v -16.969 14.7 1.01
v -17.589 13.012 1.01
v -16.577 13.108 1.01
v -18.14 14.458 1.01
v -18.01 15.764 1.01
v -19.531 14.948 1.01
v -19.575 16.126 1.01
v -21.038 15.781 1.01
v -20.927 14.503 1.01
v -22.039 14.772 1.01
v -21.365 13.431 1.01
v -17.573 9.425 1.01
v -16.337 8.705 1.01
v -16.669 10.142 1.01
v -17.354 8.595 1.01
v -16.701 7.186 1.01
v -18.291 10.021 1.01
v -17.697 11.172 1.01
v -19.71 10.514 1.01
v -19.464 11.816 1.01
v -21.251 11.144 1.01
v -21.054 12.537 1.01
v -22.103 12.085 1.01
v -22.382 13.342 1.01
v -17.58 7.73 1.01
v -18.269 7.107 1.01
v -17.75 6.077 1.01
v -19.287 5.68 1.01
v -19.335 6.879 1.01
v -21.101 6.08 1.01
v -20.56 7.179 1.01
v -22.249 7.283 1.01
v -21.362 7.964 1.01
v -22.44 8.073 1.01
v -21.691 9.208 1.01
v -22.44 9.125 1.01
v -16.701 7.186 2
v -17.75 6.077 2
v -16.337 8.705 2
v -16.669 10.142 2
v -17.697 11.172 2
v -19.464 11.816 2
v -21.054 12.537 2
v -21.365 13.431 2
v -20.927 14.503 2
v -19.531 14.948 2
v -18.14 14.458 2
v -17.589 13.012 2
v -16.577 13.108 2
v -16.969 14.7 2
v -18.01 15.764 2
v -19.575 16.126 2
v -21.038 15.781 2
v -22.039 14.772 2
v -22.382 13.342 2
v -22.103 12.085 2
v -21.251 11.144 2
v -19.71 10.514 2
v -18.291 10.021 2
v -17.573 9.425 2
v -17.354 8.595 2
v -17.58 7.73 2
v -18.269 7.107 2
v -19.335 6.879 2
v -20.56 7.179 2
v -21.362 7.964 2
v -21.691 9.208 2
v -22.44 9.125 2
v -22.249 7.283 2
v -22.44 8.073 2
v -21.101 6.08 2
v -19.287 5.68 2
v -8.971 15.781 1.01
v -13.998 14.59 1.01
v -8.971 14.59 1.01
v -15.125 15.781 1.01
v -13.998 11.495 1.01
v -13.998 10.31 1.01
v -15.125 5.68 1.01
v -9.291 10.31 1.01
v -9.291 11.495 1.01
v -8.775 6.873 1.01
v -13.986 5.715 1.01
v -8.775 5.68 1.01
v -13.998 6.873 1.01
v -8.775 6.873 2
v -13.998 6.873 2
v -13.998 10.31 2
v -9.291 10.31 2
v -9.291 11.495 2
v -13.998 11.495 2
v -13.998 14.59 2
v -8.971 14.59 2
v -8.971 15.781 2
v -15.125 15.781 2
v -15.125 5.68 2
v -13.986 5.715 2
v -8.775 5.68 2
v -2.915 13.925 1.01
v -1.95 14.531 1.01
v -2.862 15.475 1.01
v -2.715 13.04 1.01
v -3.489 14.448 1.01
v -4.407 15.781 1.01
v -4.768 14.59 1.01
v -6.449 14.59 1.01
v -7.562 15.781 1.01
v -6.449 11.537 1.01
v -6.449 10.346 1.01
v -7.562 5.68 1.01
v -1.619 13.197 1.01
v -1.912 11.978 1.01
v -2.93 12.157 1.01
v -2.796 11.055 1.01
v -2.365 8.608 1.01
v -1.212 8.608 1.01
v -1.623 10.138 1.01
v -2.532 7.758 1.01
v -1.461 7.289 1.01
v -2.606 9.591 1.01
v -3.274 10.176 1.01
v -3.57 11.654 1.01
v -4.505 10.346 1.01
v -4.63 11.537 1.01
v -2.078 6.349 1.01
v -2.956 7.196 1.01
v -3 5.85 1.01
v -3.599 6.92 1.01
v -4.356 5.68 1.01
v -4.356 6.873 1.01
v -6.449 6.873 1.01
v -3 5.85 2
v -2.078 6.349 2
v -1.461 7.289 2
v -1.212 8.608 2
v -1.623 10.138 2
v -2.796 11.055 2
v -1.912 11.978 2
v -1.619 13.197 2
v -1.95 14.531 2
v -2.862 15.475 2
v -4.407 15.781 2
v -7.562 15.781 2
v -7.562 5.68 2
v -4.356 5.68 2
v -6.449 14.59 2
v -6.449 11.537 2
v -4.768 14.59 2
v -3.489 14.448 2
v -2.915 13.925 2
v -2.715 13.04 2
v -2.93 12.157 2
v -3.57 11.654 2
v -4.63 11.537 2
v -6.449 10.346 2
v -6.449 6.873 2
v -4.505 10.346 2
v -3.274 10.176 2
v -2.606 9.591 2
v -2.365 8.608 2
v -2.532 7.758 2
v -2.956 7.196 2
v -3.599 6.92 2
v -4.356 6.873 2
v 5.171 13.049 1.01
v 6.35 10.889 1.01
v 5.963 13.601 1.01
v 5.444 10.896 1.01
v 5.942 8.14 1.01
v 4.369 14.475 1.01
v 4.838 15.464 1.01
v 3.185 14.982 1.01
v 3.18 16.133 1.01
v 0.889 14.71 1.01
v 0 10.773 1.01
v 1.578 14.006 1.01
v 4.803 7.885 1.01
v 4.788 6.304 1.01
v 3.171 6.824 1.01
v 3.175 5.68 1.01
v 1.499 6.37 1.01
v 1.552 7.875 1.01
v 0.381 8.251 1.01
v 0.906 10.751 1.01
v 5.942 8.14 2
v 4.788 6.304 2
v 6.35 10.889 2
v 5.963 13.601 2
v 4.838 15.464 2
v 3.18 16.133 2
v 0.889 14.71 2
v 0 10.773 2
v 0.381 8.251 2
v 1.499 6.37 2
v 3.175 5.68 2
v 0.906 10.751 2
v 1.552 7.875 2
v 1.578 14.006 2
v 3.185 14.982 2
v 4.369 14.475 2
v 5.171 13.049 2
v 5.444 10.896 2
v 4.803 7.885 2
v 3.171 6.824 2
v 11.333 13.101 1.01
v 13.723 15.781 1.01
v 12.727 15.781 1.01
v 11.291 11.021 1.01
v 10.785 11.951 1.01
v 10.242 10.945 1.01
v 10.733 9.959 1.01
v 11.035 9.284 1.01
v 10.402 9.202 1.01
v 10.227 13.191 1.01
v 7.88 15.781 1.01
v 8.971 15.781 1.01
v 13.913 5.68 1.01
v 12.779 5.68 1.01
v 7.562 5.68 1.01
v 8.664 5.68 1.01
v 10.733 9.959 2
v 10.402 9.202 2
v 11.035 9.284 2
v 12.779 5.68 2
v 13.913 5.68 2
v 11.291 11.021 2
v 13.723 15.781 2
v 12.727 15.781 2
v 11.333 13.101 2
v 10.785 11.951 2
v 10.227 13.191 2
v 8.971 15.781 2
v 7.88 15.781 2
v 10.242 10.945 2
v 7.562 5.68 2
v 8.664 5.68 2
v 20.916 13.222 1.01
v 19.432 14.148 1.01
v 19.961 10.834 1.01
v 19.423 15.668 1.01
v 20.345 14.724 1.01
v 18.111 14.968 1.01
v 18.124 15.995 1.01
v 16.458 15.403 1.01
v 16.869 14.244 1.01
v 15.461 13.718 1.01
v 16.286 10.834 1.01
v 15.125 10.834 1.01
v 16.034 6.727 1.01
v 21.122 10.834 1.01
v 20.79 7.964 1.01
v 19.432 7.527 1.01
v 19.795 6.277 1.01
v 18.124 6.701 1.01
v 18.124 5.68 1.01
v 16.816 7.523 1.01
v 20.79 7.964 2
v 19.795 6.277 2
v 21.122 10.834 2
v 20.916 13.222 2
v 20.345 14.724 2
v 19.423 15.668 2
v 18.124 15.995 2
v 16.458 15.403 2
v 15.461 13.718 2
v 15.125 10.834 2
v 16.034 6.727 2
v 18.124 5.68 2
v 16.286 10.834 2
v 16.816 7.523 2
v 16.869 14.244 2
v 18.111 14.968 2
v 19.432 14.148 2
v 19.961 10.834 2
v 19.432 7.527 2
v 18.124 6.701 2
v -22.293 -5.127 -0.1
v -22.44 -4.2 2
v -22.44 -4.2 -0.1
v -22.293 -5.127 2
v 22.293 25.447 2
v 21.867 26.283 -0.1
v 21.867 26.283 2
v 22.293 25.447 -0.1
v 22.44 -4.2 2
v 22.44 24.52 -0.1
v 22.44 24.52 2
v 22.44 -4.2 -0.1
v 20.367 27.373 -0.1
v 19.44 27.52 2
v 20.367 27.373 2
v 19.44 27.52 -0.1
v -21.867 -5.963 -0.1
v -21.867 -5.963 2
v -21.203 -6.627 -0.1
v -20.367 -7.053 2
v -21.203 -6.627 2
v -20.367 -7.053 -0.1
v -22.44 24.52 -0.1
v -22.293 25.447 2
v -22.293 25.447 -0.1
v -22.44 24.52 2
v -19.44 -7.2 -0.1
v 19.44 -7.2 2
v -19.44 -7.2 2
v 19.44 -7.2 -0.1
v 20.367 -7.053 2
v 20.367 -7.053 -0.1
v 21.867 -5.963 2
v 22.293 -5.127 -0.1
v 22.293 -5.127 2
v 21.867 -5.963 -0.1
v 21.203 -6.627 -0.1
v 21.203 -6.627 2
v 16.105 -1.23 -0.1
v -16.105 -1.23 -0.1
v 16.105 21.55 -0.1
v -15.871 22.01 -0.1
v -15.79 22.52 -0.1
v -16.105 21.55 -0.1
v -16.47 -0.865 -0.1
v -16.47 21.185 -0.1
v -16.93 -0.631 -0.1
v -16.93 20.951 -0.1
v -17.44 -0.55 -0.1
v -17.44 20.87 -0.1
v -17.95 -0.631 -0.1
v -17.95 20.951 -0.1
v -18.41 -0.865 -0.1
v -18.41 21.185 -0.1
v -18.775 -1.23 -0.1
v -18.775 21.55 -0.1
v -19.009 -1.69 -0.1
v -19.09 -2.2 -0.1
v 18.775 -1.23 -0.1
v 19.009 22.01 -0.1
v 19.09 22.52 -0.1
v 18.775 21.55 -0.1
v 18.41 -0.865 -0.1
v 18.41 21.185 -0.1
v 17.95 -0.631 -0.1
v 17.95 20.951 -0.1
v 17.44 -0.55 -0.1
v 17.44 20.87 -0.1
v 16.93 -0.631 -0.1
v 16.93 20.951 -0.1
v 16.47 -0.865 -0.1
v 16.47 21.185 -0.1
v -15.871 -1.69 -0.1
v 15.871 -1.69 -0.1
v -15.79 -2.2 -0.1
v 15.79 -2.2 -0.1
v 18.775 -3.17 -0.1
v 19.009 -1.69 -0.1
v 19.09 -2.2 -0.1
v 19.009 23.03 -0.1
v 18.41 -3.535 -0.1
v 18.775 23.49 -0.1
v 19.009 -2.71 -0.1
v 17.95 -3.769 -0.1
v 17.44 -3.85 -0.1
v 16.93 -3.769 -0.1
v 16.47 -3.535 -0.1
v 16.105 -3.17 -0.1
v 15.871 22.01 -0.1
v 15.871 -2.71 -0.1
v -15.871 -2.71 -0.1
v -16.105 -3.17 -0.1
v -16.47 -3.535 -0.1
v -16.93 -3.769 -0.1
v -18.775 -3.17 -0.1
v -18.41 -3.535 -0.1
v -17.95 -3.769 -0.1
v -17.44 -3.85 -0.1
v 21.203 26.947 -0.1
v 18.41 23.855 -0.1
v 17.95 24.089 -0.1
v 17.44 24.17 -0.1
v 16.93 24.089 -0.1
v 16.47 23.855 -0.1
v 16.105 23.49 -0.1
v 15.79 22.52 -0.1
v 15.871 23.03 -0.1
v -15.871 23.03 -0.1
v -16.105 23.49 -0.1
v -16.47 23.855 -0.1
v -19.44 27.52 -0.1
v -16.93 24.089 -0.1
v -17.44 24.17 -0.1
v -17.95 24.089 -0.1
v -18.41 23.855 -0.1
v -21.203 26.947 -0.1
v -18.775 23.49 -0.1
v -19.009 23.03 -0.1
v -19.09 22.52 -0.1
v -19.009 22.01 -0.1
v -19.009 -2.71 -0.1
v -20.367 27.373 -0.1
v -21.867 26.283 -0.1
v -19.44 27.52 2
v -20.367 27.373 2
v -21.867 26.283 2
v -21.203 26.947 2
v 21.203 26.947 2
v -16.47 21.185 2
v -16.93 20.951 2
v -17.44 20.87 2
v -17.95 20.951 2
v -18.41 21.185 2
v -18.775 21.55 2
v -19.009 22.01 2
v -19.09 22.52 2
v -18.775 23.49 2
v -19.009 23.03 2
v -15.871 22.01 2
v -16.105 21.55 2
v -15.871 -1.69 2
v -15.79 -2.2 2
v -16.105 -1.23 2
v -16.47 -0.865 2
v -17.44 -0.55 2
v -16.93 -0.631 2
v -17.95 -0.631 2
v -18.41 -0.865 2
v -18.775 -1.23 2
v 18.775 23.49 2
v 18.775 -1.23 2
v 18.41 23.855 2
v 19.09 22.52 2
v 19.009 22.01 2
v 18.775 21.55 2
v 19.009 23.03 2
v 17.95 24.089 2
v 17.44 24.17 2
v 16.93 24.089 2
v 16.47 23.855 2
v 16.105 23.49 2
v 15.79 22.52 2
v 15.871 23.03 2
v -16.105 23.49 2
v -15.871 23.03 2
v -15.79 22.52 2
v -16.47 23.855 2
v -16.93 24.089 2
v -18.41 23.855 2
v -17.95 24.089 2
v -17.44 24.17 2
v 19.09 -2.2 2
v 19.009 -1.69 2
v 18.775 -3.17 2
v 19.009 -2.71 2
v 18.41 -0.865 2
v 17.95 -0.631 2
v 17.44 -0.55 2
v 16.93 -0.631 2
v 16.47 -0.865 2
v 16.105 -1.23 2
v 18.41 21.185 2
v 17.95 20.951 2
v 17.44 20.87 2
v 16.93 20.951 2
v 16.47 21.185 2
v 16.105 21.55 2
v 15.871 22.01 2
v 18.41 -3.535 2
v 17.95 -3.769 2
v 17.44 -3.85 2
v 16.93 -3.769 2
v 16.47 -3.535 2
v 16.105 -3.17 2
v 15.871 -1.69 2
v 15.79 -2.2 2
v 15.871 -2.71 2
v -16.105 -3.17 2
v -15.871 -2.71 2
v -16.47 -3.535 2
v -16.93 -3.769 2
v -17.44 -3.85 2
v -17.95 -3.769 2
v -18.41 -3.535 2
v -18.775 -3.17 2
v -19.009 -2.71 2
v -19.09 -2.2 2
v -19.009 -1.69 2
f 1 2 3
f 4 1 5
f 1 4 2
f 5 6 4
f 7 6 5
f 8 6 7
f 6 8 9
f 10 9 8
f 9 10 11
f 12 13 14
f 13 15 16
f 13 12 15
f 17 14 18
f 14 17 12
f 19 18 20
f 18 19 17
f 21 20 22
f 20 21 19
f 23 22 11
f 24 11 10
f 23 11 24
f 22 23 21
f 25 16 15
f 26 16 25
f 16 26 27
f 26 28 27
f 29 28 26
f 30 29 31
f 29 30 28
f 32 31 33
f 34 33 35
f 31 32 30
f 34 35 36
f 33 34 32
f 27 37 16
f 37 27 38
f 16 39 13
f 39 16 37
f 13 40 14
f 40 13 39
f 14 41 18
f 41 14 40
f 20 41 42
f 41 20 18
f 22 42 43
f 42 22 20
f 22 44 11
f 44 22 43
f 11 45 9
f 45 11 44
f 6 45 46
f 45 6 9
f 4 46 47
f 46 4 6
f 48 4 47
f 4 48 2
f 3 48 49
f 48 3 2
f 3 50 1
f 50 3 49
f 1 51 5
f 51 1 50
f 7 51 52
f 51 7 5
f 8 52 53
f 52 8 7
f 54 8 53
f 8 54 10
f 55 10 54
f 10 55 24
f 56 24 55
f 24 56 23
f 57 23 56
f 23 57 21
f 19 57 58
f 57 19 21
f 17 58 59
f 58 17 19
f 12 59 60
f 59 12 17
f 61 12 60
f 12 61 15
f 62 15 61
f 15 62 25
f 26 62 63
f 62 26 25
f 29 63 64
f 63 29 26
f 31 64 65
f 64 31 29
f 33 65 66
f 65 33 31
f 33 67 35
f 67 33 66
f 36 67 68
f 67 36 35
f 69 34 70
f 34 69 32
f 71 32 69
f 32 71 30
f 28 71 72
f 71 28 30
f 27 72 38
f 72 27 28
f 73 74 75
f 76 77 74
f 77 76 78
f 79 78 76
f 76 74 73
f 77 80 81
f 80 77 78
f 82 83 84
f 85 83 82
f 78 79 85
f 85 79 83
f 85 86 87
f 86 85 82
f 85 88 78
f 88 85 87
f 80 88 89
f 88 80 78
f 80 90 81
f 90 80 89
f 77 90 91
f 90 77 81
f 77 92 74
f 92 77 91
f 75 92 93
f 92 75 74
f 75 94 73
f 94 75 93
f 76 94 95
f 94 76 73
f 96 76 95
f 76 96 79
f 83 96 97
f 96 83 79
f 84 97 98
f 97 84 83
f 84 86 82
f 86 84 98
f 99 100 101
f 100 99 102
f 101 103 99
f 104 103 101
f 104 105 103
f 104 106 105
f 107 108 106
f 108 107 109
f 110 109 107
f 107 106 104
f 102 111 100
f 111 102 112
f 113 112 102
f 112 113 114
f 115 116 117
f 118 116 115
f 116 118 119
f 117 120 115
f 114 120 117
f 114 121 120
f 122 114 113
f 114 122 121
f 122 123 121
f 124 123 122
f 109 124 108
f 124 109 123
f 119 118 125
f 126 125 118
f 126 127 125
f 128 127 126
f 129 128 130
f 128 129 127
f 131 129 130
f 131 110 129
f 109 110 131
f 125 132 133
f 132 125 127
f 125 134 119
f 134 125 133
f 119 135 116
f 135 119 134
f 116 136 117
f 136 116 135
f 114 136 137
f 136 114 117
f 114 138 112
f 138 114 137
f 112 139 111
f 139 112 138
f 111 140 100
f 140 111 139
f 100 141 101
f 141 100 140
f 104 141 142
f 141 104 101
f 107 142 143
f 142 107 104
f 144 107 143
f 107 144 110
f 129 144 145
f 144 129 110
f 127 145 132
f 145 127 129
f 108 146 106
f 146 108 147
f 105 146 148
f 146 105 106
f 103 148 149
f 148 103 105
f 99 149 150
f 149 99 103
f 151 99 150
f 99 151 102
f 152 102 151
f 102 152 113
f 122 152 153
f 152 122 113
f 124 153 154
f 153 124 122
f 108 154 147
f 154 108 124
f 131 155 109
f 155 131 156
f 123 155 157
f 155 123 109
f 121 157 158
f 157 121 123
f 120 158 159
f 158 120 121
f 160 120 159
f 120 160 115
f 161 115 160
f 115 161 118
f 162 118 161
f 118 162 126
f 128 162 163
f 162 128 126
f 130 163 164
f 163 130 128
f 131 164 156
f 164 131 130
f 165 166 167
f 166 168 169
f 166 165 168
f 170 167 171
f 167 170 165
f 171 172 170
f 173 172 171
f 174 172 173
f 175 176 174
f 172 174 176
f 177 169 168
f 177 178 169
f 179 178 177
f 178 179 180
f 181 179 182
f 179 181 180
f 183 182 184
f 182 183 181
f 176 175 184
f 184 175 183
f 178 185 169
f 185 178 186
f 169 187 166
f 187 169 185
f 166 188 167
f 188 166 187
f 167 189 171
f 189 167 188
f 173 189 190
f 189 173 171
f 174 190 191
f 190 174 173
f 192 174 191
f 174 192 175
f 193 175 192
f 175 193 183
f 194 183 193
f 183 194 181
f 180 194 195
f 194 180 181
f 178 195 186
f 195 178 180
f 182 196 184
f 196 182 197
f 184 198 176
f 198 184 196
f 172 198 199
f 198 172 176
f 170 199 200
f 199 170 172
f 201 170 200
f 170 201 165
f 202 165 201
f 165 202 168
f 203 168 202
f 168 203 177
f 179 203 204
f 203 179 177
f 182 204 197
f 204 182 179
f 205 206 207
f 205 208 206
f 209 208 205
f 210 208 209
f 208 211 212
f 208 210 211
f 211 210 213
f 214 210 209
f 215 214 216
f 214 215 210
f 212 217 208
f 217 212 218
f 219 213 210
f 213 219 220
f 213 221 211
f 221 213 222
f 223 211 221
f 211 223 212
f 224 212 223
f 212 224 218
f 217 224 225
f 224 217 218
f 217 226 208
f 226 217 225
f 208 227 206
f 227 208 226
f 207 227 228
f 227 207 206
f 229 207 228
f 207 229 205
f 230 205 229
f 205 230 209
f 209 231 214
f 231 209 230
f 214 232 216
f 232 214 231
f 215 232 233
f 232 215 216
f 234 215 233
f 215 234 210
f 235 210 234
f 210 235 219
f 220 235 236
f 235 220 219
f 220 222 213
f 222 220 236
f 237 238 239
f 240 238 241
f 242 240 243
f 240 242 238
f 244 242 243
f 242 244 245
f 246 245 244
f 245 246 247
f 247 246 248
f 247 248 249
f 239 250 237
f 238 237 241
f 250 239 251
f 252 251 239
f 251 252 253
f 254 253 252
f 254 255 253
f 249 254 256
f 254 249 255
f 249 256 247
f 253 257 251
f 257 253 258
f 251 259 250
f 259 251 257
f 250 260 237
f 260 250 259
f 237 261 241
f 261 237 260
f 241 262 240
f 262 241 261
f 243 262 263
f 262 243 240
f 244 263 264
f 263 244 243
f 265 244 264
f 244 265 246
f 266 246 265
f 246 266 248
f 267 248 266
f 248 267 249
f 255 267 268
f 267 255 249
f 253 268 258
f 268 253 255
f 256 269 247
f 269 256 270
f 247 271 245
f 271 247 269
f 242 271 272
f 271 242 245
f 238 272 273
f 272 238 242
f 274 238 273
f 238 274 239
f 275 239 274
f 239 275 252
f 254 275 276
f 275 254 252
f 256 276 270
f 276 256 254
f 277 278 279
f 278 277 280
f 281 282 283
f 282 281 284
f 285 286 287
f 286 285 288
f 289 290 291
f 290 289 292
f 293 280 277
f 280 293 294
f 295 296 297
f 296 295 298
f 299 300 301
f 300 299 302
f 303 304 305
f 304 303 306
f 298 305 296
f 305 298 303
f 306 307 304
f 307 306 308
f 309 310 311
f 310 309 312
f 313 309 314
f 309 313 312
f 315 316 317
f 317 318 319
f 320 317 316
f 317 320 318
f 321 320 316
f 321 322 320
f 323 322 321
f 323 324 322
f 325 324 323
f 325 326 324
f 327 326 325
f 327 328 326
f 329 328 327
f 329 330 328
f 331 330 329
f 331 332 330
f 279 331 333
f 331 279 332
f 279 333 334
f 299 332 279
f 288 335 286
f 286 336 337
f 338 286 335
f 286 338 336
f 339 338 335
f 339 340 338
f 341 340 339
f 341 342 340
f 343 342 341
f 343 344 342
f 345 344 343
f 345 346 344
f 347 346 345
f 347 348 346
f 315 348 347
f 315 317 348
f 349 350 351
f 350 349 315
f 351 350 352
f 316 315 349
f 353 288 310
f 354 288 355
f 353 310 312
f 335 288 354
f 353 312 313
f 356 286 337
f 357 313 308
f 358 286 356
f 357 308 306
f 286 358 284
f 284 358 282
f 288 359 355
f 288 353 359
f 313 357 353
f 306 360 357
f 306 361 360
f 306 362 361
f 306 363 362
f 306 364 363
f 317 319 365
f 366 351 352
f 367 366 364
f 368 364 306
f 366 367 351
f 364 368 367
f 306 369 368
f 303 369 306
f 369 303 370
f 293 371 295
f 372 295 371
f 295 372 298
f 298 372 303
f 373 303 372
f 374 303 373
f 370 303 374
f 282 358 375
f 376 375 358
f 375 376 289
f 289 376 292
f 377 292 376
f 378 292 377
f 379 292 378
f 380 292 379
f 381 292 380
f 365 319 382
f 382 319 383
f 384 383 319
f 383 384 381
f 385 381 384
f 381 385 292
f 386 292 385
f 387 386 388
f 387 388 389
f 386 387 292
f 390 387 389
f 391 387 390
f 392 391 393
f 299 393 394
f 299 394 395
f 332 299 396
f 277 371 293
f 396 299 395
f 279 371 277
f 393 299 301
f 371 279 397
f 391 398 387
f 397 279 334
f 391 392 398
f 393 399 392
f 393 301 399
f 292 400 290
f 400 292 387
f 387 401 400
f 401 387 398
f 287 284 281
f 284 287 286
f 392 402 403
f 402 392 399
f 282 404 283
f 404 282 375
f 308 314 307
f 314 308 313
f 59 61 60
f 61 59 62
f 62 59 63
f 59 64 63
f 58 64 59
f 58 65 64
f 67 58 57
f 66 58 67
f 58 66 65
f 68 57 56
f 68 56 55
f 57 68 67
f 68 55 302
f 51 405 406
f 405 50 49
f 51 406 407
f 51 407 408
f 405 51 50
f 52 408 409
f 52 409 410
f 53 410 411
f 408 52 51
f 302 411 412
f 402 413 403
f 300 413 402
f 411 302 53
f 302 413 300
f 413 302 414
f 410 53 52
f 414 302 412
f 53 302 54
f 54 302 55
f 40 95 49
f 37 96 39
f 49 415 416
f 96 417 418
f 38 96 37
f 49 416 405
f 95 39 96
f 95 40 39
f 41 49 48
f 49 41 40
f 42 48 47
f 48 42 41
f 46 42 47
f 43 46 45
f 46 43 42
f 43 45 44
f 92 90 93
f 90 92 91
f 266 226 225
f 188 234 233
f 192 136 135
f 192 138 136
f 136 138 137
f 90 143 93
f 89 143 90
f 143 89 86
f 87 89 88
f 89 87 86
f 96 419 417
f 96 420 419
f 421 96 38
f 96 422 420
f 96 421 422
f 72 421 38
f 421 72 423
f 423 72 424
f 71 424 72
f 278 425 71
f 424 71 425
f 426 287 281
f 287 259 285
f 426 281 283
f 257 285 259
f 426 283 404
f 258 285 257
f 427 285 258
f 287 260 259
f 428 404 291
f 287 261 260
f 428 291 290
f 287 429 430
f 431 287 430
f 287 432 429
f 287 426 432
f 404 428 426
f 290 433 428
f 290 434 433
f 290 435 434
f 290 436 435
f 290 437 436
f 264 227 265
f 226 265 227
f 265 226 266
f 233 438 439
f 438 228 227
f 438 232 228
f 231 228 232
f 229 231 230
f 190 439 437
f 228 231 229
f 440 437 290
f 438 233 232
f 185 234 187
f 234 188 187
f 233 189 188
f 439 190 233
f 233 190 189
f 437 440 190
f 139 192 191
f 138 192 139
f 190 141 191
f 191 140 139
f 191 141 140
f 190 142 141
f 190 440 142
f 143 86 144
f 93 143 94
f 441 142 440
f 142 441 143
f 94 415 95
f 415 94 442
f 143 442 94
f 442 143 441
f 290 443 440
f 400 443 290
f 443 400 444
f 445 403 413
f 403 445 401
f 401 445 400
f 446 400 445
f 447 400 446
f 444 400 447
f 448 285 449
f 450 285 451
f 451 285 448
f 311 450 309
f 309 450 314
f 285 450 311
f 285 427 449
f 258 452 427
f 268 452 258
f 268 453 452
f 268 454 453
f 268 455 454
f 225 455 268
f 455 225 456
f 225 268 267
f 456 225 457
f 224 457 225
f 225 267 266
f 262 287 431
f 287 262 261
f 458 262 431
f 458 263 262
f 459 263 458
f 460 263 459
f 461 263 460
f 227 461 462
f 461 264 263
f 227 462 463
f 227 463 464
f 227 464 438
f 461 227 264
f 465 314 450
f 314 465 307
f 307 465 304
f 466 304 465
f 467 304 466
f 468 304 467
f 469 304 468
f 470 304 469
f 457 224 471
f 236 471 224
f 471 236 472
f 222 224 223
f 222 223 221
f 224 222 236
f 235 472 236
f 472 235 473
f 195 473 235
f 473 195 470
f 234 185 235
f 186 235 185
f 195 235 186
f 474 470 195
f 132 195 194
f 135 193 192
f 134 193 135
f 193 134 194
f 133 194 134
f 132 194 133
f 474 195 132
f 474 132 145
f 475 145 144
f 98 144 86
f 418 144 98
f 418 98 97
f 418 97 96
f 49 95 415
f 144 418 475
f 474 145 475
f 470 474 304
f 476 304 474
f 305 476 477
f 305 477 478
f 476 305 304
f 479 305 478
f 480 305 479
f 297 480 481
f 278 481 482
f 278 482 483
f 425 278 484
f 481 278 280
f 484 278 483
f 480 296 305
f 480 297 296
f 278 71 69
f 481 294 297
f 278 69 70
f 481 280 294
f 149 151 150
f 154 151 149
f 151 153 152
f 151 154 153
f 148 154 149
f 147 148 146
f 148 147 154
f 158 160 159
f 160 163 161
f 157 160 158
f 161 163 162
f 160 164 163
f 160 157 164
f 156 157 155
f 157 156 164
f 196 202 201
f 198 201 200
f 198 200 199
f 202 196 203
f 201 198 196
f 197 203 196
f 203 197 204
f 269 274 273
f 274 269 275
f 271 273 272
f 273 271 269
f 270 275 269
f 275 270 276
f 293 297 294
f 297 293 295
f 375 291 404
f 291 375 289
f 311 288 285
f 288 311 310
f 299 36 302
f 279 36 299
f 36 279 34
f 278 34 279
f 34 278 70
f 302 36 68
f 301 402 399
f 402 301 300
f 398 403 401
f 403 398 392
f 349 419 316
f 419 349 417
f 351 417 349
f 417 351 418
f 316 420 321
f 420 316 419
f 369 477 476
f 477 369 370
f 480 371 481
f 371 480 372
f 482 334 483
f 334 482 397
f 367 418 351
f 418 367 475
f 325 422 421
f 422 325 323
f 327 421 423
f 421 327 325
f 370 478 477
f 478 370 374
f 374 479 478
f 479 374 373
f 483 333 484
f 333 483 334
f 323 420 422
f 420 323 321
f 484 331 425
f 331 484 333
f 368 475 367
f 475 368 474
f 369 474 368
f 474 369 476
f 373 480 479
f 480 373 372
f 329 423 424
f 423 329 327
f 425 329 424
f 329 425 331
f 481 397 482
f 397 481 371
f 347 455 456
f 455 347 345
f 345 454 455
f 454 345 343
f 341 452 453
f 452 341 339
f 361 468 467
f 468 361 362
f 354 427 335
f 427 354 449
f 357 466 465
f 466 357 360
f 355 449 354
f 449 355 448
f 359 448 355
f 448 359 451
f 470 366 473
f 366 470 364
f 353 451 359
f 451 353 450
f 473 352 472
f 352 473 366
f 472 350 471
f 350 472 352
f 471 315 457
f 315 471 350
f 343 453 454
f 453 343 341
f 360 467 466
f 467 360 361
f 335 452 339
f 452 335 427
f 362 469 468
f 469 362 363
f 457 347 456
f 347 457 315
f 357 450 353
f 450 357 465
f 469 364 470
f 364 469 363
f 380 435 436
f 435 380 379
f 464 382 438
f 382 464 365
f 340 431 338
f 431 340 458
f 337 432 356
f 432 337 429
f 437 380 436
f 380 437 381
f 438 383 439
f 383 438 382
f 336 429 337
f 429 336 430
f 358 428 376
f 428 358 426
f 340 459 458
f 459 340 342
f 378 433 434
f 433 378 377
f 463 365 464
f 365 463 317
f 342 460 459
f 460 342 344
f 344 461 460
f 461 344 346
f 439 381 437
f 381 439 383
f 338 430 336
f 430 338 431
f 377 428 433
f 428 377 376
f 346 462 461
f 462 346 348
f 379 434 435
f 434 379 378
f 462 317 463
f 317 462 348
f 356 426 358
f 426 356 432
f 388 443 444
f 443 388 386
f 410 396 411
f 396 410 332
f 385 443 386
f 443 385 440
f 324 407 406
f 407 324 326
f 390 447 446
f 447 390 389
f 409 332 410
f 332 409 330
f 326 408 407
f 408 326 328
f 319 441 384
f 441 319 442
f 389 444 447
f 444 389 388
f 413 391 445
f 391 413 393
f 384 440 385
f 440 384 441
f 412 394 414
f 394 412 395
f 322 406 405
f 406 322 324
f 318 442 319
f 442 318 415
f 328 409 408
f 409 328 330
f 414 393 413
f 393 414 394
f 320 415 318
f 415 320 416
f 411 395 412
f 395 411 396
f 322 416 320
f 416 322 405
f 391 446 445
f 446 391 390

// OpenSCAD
// file: ../configuration.scad
//Název boxu (zařízení)
box_jmeno="BASEBOX02A";

vzdalenost_der = 10.16; //rozteč děr mezi sebou
radidus_hrany = 3; //radius zaobleni sloupku
vzdalenost_od_okraje = 5.2; //vzdalenost stredu upevnovaci diry od kraje desky
pocet_der1 = 3; //pocet děr v ose y
pocet_der2 = 4; //pocet der v ose x



//OBECNE PARAMETRY KRABICKY
//------------------------------------------------------------
//BOCNICE
vyska_bocnice=40;
tloustka_bocnice=3;


//PLBASE PARAMETRY
//------------------------------------------------------------
tloustka_plbase = 2; //tloustka plbase - dna
prekryti_der=0.3; //sila materiálu, který překrývá díry, aby nebyli vidět

plbase_tolerance_horni=0.5; //pro zvětšení tolerance aby tam šlo dát  horní čelíčko


//Rozmery loga MLAB
//------------------------------------------------------------
logo_vyska=0.15;
logo_sirka=0.15;
// file: ../src/manufactury_conf.scad
$fn=20; // model faces resolution.

 //Sroub - podpěra pro tisk sloupku
        vyska_podpery=12;
        vyska_mat_pod_matici=3;

//Sroub - parametry
vyska_hlavy = 3.5;
prumer_hlavy=6;
prumer_sroubu=3.3;

//Matice - parametry
prumer_matice=6; //hrany k hraně
vyska_matice=3;  //vyska matice
posuv_dorazu=0.5;  //pro moznost posuvu dorazu pro vsunutí matice
matice_sila_materialu=2; //sila materialu pod maticí na ose z


//Lišta parametry
//---------------------------------------------------
//rozměry výrezu v ose y
vzdalenost_od_diry = 5; //vzdalenost od stredu upevnovaci diry na druhou stranu


//Spodní Kryt
vyska_prekryti_spodni=3;
vyska_prekryti_vrchni=4;
prekryti_tolerance=0.6;
tolerance_na_nasunuti=0.3;
sila_spodniho_krytu=1;

//Pro vrchni PLBASE
hrana_bocnice=1.2; //udává jaká síla bocnice zůstane v části zapustěni vrchního čelička
// main file
use <../src/plbase.scad>



include <../src/manufactury_conf.scad>
include <../configuration.scad>


 translate([0,0,tloustka_plbase/2])
rotate(a=[0,0,0])
    {
        
       plbase_vrchni_kryt_pro_odecet(pocet_der1-1,pocet_der2-1,radidus_hrany,vzdalenost_der,vzdalenost_od_okraje,prumer_sroubu,vyska_bocnice,prekryti_der,tloustka_bocnice,-0.2,tloustka_plbase);
        
     }
